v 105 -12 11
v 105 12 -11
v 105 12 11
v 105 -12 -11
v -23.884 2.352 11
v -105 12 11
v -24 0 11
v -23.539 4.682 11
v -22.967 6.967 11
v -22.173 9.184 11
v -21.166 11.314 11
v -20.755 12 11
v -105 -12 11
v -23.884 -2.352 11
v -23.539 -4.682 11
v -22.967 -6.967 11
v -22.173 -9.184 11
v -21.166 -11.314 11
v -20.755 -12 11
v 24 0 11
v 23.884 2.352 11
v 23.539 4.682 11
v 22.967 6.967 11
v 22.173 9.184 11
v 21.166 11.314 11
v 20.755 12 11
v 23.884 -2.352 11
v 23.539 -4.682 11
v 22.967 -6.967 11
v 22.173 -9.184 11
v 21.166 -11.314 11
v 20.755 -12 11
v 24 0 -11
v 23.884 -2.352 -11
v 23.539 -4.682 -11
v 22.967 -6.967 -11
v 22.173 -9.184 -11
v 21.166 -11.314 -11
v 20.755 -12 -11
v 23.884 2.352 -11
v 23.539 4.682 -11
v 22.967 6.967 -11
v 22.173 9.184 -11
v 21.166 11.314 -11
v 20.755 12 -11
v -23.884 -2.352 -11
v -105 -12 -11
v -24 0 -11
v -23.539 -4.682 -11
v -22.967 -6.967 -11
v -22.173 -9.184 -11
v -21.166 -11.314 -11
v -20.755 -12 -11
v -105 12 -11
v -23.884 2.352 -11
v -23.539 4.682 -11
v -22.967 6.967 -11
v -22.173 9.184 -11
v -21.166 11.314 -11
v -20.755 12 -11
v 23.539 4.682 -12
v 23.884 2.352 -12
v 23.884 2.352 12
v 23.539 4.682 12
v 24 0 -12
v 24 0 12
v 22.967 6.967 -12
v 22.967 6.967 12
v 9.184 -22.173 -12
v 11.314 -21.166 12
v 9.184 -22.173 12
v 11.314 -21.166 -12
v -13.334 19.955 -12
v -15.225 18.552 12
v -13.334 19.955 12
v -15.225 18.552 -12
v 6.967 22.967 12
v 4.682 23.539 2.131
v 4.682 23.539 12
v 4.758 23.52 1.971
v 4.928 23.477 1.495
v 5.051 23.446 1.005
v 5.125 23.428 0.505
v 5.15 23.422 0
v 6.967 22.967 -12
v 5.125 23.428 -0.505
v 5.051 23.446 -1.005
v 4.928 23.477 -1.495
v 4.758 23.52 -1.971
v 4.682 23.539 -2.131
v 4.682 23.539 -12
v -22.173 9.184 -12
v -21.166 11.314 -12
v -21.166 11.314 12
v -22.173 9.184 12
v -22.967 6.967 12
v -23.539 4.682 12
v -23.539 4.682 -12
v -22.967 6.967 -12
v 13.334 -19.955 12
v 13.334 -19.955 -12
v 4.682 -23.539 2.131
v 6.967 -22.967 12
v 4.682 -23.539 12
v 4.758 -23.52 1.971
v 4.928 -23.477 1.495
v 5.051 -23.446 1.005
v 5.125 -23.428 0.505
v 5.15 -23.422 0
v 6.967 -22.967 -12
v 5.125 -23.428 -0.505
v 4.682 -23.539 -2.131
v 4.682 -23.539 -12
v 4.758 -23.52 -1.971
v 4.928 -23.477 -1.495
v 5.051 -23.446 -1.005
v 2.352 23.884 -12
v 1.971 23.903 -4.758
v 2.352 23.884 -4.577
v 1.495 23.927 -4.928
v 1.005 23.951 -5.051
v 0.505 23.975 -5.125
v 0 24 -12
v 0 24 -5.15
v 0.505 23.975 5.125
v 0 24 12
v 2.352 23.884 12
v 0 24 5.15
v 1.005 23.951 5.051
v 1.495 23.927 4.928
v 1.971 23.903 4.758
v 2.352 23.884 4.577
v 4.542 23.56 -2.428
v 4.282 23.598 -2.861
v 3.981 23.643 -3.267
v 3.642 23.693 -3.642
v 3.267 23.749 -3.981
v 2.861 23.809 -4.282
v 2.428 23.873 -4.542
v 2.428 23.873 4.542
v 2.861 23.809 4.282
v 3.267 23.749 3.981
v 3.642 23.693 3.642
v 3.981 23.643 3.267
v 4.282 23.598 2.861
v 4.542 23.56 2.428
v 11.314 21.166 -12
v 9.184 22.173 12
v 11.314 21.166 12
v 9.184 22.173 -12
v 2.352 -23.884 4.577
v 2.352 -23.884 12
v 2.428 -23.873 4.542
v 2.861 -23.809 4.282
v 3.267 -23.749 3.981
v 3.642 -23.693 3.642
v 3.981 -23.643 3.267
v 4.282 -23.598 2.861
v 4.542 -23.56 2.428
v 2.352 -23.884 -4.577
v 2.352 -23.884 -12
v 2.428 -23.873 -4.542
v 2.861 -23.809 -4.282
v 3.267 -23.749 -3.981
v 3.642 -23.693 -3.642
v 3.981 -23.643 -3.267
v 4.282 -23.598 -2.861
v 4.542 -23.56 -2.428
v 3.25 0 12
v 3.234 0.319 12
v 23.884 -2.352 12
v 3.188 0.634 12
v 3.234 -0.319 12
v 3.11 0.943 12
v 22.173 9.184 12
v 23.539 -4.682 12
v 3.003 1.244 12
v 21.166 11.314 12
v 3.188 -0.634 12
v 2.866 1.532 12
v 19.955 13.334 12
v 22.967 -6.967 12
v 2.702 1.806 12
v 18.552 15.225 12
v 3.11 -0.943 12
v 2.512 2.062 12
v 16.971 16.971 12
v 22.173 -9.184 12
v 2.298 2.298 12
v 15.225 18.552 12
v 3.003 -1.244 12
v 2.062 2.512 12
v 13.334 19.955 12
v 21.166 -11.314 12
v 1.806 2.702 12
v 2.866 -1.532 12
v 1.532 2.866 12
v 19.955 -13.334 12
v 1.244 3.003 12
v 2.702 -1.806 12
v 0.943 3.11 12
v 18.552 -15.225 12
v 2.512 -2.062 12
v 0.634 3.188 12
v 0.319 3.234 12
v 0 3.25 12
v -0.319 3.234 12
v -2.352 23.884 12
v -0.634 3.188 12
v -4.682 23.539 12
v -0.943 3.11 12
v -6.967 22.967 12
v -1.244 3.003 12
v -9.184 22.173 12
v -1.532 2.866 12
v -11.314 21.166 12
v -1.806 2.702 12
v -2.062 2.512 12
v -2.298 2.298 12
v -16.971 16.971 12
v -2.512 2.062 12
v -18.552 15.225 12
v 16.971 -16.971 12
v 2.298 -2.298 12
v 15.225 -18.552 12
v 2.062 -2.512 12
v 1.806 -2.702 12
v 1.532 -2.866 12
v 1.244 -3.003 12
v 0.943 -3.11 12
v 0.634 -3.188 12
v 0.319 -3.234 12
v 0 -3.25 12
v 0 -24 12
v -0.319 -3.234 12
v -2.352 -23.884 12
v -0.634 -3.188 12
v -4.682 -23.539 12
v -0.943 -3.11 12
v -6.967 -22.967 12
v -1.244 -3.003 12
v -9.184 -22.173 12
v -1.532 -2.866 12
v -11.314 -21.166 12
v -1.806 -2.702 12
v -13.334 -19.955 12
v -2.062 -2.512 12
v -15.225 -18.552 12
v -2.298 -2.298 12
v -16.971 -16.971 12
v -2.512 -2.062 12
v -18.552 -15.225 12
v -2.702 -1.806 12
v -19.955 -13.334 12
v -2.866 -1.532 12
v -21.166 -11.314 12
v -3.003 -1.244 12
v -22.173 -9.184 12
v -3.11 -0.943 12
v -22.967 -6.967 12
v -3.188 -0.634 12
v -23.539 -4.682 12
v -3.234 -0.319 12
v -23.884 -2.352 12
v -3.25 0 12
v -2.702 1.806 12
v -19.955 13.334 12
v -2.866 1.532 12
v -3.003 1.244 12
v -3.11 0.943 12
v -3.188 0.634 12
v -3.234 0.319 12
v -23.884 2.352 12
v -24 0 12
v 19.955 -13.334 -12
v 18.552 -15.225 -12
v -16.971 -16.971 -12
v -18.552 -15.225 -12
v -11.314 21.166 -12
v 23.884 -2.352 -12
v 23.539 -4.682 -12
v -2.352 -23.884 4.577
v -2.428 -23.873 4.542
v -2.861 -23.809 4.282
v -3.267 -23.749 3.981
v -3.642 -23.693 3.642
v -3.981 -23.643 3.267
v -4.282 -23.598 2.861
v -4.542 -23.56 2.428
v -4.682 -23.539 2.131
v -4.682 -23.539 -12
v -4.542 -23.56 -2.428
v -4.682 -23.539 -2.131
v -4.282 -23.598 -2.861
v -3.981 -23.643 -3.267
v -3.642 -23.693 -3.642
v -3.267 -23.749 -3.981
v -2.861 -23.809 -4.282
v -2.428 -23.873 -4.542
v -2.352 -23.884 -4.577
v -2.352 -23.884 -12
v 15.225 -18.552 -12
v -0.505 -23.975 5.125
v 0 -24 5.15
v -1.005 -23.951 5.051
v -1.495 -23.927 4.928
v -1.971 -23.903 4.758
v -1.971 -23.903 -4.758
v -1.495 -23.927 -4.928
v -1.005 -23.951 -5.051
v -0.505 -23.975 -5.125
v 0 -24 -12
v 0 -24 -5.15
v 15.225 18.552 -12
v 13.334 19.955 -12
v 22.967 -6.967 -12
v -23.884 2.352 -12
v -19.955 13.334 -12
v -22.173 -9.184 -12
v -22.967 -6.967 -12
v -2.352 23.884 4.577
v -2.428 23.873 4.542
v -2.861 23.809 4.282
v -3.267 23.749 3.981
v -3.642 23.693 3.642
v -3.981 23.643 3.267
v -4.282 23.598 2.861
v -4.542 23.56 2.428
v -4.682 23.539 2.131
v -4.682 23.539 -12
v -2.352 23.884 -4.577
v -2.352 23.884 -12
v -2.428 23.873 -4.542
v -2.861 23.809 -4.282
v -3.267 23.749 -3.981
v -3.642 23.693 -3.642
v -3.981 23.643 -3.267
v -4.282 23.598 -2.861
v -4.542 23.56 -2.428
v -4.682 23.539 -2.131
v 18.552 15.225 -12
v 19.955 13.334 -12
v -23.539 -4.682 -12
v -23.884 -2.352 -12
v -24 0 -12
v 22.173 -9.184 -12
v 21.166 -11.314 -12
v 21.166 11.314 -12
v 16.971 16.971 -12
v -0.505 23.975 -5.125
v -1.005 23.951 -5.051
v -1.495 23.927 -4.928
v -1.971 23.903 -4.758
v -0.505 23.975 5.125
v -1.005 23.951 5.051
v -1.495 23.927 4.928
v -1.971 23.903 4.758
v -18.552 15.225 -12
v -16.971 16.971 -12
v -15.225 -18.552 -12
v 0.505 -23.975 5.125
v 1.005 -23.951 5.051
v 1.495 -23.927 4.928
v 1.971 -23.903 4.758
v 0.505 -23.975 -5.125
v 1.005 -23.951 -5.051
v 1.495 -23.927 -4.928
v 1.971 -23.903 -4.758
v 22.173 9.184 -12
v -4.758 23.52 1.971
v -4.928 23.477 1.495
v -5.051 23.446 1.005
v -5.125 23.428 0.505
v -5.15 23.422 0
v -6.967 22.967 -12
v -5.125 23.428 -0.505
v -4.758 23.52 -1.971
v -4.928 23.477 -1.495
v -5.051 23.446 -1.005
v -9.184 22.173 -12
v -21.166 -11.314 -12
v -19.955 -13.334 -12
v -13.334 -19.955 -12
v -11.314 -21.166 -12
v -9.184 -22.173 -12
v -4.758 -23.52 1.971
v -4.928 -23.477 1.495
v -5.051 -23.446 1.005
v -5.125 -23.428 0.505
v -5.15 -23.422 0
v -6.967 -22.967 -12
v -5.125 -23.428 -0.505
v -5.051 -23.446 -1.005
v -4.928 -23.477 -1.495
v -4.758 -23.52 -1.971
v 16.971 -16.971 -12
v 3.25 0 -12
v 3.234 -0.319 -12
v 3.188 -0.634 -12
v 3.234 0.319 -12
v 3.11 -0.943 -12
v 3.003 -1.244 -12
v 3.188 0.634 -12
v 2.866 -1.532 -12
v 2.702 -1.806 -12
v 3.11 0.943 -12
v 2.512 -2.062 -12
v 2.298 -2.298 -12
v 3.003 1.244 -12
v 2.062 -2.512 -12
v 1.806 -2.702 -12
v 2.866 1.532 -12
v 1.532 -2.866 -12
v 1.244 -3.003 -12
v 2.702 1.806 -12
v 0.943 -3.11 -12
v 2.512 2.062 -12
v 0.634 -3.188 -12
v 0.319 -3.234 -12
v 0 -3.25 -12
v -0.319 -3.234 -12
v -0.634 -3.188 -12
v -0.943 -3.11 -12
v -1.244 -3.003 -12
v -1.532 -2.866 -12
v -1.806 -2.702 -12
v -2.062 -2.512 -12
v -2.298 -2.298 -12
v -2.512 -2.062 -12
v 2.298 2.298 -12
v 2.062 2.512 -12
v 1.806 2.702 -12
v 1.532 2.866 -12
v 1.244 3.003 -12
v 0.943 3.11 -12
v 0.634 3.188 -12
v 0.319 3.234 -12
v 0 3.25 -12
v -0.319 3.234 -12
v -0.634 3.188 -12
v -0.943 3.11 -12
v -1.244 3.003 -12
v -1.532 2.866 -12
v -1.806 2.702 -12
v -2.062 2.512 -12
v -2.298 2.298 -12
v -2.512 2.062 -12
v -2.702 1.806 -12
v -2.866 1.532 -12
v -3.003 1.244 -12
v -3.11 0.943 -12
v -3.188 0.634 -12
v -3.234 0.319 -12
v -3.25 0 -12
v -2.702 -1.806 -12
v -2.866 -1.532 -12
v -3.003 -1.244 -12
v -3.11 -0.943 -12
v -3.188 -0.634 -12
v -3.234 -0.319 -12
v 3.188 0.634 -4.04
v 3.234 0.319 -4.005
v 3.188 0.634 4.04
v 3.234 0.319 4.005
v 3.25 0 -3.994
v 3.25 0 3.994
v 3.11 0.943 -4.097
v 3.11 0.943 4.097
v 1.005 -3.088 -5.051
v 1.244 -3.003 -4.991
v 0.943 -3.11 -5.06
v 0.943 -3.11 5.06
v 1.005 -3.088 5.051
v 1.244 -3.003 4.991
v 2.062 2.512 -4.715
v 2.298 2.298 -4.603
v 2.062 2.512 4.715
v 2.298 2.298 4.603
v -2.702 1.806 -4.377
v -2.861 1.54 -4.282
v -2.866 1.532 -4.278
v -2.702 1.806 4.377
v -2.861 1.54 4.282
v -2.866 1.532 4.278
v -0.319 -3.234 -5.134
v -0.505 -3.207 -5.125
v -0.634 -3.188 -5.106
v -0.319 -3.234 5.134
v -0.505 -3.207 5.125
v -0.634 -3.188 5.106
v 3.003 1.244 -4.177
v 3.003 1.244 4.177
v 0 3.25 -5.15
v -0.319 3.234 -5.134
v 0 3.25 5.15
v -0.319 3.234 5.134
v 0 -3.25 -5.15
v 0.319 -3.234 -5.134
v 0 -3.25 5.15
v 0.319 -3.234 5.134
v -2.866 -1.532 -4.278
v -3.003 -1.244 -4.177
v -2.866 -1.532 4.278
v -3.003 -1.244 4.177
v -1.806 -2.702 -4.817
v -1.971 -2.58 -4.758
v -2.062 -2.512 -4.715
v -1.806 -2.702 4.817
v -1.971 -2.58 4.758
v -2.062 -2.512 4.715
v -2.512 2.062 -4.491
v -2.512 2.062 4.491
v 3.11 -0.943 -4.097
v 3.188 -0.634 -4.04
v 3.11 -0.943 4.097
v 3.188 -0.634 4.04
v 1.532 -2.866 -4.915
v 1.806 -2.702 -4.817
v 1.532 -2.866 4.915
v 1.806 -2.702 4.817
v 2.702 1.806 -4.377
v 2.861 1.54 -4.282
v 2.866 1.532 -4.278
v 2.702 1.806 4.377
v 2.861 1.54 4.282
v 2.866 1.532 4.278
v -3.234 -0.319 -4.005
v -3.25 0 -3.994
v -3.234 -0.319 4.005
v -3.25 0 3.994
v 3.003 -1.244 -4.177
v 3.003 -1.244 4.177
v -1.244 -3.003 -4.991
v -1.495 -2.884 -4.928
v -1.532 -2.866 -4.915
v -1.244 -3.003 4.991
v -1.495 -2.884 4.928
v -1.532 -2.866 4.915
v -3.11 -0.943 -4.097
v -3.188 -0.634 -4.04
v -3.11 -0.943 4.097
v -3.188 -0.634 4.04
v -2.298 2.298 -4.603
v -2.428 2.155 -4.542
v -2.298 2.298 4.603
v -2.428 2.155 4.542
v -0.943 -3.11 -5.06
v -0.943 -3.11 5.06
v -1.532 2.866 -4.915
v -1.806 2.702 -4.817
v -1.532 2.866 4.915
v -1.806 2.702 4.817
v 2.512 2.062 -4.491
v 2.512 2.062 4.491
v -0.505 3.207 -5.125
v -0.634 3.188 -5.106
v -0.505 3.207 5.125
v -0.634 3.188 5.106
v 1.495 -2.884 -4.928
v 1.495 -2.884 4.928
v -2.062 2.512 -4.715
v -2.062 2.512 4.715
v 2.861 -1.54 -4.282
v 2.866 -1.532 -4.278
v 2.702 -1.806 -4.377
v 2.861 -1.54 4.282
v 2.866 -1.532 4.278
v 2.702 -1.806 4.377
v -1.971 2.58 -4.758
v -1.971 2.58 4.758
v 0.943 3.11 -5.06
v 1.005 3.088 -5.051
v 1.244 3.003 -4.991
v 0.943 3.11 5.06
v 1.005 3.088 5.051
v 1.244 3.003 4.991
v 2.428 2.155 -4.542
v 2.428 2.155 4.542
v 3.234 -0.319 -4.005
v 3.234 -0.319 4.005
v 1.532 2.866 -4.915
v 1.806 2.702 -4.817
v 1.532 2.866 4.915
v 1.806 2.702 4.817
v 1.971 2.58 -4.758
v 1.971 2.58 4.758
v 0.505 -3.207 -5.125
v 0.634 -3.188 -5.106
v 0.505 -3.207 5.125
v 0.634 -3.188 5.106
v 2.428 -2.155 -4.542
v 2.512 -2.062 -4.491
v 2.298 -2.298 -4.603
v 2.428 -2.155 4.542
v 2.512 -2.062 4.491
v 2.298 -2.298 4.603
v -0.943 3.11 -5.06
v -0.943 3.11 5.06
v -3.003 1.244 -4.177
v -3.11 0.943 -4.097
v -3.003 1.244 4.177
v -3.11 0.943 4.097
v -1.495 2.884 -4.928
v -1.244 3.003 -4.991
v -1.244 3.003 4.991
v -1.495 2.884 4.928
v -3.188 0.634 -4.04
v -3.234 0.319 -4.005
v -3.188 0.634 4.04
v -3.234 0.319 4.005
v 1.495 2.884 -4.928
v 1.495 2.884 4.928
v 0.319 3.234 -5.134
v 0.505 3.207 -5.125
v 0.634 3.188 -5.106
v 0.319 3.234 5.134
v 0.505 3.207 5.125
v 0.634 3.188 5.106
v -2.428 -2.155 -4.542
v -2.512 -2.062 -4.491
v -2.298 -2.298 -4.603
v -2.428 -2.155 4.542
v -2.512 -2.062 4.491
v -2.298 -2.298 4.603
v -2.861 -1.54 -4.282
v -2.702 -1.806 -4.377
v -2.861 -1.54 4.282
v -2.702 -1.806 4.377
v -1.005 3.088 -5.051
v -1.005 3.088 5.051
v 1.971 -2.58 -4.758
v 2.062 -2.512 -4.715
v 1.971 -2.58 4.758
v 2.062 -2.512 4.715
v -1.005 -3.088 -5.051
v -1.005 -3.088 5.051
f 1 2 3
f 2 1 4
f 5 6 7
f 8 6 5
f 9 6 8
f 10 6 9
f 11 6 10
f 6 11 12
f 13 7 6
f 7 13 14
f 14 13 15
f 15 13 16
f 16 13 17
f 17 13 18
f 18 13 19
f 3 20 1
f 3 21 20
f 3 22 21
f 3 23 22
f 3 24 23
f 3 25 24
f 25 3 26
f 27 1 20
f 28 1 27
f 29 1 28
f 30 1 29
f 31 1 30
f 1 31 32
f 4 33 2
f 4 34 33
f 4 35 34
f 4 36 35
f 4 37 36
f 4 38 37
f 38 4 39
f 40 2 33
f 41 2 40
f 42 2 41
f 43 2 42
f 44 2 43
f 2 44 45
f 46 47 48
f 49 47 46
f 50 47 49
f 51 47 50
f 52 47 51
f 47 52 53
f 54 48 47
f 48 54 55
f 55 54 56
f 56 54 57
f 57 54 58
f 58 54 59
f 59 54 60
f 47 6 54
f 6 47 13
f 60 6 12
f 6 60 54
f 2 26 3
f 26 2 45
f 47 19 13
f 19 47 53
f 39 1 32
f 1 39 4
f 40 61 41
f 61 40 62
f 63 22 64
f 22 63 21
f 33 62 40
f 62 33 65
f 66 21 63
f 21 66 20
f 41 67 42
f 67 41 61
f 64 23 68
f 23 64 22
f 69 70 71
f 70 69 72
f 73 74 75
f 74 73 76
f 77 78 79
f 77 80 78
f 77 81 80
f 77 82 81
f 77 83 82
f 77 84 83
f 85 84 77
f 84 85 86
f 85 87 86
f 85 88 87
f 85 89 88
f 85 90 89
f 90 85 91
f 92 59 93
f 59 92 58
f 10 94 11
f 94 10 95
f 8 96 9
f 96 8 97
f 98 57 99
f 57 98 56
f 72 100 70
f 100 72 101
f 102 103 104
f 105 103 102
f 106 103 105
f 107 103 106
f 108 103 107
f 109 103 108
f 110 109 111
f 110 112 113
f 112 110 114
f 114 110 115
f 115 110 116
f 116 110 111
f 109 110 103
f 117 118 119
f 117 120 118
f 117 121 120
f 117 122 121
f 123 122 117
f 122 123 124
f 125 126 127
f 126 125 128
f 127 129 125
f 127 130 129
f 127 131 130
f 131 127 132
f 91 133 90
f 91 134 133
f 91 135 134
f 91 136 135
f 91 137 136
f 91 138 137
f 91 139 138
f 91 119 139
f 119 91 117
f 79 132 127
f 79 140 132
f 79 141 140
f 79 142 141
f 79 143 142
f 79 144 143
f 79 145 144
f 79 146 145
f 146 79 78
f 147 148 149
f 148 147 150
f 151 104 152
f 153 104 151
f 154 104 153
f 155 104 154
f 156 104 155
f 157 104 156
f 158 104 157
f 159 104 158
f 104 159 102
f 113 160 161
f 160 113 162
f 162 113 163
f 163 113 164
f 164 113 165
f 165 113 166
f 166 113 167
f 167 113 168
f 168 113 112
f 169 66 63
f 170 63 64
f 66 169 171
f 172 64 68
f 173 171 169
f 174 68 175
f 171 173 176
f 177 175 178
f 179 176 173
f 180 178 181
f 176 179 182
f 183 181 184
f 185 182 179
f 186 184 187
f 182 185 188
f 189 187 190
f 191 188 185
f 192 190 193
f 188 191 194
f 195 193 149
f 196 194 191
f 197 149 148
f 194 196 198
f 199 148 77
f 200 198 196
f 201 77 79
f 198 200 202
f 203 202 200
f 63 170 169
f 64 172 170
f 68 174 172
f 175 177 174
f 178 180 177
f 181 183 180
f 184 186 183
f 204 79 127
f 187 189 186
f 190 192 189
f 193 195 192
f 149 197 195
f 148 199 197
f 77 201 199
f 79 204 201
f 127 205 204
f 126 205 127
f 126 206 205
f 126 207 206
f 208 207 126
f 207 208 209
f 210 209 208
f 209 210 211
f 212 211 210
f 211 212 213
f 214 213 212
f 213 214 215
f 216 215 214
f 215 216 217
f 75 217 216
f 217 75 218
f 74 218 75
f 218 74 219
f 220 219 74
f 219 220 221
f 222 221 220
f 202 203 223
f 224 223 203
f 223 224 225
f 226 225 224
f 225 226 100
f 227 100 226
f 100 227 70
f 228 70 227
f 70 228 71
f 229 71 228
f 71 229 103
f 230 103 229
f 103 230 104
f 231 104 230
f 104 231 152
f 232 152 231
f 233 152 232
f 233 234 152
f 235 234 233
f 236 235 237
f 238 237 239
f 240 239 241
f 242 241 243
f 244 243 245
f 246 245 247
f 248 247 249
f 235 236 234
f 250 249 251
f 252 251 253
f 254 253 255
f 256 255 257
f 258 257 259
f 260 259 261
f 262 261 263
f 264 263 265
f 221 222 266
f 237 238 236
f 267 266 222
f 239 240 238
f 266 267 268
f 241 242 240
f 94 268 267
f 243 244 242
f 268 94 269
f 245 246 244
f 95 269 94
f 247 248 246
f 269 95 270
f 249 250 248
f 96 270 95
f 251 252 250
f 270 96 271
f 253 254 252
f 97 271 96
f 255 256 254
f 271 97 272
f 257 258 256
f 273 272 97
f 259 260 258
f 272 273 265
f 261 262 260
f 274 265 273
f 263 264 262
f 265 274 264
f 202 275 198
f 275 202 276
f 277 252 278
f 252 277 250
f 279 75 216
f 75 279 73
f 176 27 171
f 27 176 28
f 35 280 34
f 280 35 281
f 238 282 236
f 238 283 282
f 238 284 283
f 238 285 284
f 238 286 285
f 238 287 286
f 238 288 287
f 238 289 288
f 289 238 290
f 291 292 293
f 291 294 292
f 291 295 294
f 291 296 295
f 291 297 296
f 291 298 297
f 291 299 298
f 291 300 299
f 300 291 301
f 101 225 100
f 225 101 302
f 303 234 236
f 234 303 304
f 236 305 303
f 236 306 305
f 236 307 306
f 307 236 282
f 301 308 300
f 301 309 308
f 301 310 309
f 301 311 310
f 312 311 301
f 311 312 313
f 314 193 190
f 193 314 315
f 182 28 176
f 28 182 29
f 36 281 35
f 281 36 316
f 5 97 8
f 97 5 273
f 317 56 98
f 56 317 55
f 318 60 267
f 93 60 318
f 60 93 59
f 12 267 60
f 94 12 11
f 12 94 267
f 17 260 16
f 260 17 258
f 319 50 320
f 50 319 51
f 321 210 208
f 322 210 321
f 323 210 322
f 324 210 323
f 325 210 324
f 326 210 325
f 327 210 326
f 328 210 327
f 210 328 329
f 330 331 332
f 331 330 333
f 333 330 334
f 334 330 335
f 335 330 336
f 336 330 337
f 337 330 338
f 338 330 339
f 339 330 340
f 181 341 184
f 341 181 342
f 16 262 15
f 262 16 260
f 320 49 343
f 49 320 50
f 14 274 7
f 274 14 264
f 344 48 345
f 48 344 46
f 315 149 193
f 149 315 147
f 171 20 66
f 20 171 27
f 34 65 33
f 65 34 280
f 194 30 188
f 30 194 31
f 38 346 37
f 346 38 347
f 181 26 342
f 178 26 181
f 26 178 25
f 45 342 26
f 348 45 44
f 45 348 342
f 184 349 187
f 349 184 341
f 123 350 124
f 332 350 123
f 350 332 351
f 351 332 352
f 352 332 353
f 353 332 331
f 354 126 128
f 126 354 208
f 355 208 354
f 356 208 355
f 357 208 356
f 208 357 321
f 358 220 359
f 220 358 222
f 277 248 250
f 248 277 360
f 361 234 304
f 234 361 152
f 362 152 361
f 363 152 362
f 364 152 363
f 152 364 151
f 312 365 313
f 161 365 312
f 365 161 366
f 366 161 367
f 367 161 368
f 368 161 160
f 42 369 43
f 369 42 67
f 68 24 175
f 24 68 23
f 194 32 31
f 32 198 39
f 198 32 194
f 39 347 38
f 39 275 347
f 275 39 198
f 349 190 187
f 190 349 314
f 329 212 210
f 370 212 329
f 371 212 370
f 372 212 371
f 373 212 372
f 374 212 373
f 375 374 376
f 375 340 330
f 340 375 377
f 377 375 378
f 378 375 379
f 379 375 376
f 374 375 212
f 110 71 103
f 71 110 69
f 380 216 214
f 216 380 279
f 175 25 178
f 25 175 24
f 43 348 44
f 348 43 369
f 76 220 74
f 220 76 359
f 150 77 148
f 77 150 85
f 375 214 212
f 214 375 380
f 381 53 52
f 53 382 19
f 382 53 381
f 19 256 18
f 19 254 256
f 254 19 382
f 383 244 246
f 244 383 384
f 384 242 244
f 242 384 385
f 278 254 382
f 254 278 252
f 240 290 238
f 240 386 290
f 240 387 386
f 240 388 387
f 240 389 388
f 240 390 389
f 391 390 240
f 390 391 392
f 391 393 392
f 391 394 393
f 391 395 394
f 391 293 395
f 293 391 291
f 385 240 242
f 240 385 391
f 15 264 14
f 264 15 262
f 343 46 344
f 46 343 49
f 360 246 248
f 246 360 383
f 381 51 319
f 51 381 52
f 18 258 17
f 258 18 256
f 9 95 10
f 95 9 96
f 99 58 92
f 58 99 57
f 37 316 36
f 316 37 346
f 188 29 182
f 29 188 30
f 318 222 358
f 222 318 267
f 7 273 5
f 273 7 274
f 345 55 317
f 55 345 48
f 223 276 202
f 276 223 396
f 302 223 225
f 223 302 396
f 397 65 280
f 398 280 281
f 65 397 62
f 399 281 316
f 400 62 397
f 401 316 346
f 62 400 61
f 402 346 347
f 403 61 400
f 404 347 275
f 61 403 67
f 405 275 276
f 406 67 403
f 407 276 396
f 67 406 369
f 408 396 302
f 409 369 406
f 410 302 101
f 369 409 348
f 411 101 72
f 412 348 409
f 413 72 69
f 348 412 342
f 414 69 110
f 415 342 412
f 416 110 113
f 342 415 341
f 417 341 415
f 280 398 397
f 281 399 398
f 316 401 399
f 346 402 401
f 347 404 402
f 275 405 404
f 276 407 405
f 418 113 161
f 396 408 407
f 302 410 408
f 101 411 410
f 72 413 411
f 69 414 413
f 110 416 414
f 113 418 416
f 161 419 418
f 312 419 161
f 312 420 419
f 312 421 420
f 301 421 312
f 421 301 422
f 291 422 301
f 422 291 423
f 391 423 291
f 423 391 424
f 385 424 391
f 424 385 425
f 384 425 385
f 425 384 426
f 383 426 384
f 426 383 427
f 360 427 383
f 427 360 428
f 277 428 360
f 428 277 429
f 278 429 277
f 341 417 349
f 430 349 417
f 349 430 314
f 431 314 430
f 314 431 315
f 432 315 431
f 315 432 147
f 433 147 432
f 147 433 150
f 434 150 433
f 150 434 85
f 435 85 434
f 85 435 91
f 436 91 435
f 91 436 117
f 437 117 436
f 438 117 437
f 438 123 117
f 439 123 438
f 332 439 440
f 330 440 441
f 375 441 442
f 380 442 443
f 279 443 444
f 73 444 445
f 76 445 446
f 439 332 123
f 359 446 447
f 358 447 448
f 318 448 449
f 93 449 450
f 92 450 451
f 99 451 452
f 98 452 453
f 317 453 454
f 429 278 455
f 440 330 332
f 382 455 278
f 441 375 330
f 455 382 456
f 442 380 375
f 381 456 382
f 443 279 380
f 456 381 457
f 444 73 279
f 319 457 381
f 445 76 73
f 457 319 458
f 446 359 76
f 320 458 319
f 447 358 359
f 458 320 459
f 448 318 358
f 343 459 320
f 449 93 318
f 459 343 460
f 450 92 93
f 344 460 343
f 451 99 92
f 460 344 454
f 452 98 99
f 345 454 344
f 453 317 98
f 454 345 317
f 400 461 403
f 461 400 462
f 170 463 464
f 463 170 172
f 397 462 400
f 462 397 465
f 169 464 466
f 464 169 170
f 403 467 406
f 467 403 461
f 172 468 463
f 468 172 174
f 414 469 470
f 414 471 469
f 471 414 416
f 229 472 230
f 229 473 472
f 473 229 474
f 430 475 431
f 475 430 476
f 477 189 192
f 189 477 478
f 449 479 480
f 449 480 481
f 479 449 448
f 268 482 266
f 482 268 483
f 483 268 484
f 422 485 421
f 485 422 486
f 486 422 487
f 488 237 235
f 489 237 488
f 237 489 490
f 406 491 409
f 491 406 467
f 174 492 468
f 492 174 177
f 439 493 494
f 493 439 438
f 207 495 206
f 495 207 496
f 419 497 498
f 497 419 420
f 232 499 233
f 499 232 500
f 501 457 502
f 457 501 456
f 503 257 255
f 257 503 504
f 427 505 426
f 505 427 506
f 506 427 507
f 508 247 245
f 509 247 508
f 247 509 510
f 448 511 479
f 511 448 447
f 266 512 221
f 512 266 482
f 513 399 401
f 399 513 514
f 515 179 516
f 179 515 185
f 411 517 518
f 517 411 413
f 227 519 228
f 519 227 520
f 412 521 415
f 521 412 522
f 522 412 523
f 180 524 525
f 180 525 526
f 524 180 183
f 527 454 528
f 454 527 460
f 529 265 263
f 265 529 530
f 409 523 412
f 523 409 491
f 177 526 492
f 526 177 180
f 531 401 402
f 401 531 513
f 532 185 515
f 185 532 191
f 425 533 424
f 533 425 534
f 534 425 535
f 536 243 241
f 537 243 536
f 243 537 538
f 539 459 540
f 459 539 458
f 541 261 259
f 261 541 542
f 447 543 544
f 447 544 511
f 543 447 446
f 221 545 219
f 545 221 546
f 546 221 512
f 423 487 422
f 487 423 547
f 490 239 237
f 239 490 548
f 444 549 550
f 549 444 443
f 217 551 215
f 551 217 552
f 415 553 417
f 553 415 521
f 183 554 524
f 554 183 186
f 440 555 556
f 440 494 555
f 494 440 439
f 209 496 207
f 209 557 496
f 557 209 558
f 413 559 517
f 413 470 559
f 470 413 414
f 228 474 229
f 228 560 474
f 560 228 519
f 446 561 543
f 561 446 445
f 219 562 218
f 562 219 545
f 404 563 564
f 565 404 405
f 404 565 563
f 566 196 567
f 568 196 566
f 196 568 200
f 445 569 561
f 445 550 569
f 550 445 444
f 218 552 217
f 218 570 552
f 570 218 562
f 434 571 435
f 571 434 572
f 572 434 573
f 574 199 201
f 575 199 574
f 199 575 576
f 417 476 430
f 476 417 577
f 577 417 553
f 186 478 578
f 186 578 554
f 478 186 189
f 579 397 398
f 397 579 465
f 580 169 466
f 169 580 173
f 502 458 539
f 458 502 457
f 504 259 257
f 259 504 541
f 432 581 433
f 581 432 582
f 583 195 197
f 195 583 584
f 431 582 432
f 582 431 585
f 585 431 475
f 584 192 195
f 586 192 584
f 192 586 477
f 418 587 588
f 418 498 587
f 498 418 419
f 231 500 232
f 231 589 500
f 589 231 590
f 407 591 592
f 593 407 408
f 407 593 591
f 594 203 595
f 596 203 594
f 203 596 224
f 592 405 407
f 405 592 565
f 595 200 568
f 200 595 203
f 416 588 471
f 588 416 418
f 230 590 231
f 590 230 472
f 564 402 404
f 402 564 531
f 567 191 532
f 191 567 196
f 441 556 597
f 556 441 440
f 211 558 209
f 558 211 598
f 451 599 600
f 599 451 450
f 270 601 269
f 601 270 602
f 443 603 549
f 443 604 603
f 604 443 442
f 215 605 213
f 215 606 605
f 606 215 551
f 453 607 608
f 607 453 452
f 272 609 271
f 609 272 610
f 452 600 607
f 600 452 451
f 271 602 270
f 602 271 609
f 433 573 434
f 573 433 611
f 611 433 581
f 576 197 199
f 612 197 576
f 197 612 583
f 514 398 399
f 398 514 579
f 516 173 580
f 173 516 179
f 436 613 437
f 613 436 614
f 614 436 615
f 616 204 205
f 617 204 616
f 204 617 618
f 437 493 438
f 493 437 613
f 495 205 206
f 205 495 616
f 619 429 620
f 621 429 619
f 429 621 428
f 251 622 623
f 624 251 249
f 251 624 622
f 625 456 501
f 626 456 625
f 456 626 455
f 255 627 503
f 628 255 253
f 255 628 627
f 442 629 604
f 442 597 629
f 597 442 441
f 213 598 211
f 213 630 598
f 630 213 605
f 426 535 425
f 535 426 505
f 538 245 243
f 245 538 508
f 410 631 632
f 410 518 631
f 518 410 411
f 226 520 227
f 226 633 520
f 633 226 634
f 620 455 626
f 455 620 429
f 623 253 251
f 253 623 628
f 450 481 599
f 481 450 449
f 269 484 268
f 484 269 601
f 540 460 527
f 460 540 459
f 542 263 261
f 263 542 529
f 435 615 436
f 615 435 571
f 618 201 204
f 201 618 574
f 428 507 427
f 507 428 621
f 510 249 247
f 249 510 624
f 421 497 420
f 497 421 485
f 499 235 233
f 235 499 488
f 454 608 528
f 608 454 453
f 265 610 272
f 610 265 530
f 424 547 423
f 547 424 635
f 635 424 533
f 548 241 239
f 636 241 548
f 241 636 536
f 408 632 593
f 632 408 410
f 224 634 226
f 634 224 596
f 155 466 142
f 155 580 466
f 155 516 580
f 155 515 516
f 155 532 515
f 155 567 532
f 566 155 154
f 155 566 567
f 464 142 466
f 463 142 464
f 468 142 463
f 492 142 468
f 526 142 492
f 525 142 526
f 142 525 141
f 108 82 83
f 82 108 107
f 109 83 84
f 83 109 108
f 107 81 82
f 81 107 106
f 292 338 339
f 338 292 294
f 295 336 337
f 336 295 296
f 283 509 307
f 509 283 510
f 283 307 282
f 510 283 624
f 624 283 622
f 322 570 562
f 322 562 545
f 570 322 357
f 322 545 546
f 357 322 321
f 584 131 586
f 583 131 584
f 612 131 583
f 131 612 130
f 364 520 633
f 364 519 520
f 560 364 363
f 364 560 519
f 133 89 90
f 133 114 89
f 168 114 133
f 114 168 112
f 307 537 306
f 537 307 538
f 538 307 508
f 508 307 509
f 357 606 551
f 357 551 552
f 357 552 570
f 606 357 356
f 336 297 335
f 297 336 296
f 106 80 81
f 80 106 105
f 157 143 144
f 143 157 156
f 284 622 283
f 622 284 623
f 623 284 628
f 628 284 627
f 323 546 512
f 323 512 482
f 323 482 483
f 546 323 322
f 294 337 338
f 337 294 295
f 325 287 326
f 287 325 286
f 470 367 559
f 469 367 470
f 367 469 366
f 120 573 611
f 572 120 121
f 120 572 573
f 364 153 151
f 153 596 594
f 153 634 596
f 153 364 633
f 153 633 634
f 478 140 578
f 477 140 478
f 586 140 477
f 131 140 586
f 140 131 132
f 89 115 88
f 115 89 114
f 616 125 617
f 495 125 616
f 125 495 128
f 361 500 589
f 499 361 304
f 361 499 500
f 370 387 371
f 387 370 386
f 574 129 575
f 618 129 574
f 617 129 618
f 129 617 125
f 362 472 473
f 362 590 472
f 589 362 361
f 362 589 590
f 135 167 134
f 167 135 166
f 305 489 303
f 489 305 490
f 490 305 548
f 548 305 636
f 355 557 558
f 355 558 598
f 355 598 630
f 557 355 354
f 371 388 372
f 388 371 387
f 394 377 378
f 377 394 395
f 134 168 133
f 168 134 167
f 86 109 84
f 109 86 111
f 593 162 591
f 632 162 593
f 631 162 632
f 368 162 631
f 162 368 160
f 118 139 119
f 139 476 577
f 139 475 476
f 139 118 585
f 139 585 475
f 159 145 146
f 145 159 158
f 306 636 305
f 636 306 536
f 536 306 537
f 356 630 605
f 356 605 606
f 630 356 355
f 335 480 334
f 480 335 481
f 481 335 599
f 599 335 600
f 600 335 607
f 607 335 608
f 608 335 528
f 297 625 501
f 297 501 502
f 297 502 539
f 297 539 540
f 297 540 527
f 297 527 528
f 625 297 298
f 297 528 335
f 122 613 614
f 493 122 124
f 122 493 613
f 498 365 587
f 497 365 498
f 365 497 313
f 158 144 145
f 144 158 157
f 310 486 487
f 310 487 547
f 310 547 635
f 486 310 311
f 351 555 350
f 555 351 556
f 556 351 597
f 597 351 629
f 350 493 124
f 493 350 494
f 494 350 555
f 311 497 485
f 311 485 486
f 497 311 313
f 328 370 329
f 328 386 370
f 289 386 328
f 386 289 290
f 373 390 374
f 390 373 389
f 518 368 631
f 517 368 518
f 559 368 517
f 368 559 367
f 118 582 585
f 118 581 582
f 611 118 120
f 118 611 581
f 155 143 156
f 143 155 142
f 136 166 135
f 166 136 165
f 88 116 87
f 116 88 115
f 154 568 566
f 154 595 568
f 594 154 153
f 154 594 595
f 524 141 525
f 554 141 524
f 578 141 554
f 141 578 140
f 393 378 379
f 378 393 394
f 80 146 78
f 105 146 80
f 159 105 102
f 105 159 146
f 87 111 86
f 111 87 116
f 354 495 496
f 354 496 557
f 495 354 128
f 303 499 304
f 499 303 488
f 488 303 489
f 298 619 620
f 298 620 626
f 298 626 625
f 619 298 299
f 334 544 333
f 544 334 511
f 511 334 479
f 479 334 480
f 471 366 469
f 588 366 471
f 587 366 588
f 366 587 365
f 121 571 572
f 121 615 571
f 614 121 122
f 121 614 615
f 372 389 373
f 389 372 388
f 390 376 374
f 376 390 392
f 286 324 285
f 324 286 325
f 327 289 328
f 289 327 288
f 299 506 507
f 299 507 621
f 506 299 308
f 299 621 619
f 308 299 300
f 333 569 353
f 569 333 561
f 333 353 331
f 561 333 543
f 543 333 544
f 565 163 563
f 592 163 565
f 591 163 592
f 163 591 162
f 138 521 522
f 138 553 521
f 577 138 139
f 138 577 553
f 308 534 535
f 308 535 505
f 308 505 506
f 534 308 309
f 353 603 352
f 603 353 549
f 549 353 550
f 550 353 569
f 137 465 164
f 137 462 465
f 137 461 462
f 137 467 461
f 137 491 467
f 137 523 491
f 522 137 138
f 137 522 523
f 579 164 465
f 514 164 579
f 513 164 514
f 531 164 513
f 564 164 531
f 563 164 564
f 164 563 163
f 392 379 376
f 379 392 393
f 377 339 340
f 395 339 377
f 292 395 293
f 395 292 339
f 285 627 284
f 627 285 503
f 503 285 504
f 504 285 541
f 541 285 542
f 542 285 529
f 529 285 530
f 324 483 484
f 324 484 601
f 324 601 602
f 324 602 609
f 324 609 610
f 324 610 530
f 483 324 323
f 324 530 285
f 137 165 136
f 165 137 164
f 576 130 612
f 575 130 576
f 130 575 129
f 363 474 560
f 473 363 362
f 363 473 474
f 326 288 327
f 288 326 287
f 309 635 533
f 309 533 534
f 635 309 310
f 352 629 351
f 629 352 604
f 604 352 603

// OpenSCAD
$fn=64;shaft=10.3;m6=6.5;
difference(){union(){cube([210,24,22],center=true);cylinder(h=24,d=48,center=true);}rotate([90,0,0])cylinder(h=50,d=shaft,center=true);for(x=[-88,88])cylinder(h=40,d=m6,center=true);}
